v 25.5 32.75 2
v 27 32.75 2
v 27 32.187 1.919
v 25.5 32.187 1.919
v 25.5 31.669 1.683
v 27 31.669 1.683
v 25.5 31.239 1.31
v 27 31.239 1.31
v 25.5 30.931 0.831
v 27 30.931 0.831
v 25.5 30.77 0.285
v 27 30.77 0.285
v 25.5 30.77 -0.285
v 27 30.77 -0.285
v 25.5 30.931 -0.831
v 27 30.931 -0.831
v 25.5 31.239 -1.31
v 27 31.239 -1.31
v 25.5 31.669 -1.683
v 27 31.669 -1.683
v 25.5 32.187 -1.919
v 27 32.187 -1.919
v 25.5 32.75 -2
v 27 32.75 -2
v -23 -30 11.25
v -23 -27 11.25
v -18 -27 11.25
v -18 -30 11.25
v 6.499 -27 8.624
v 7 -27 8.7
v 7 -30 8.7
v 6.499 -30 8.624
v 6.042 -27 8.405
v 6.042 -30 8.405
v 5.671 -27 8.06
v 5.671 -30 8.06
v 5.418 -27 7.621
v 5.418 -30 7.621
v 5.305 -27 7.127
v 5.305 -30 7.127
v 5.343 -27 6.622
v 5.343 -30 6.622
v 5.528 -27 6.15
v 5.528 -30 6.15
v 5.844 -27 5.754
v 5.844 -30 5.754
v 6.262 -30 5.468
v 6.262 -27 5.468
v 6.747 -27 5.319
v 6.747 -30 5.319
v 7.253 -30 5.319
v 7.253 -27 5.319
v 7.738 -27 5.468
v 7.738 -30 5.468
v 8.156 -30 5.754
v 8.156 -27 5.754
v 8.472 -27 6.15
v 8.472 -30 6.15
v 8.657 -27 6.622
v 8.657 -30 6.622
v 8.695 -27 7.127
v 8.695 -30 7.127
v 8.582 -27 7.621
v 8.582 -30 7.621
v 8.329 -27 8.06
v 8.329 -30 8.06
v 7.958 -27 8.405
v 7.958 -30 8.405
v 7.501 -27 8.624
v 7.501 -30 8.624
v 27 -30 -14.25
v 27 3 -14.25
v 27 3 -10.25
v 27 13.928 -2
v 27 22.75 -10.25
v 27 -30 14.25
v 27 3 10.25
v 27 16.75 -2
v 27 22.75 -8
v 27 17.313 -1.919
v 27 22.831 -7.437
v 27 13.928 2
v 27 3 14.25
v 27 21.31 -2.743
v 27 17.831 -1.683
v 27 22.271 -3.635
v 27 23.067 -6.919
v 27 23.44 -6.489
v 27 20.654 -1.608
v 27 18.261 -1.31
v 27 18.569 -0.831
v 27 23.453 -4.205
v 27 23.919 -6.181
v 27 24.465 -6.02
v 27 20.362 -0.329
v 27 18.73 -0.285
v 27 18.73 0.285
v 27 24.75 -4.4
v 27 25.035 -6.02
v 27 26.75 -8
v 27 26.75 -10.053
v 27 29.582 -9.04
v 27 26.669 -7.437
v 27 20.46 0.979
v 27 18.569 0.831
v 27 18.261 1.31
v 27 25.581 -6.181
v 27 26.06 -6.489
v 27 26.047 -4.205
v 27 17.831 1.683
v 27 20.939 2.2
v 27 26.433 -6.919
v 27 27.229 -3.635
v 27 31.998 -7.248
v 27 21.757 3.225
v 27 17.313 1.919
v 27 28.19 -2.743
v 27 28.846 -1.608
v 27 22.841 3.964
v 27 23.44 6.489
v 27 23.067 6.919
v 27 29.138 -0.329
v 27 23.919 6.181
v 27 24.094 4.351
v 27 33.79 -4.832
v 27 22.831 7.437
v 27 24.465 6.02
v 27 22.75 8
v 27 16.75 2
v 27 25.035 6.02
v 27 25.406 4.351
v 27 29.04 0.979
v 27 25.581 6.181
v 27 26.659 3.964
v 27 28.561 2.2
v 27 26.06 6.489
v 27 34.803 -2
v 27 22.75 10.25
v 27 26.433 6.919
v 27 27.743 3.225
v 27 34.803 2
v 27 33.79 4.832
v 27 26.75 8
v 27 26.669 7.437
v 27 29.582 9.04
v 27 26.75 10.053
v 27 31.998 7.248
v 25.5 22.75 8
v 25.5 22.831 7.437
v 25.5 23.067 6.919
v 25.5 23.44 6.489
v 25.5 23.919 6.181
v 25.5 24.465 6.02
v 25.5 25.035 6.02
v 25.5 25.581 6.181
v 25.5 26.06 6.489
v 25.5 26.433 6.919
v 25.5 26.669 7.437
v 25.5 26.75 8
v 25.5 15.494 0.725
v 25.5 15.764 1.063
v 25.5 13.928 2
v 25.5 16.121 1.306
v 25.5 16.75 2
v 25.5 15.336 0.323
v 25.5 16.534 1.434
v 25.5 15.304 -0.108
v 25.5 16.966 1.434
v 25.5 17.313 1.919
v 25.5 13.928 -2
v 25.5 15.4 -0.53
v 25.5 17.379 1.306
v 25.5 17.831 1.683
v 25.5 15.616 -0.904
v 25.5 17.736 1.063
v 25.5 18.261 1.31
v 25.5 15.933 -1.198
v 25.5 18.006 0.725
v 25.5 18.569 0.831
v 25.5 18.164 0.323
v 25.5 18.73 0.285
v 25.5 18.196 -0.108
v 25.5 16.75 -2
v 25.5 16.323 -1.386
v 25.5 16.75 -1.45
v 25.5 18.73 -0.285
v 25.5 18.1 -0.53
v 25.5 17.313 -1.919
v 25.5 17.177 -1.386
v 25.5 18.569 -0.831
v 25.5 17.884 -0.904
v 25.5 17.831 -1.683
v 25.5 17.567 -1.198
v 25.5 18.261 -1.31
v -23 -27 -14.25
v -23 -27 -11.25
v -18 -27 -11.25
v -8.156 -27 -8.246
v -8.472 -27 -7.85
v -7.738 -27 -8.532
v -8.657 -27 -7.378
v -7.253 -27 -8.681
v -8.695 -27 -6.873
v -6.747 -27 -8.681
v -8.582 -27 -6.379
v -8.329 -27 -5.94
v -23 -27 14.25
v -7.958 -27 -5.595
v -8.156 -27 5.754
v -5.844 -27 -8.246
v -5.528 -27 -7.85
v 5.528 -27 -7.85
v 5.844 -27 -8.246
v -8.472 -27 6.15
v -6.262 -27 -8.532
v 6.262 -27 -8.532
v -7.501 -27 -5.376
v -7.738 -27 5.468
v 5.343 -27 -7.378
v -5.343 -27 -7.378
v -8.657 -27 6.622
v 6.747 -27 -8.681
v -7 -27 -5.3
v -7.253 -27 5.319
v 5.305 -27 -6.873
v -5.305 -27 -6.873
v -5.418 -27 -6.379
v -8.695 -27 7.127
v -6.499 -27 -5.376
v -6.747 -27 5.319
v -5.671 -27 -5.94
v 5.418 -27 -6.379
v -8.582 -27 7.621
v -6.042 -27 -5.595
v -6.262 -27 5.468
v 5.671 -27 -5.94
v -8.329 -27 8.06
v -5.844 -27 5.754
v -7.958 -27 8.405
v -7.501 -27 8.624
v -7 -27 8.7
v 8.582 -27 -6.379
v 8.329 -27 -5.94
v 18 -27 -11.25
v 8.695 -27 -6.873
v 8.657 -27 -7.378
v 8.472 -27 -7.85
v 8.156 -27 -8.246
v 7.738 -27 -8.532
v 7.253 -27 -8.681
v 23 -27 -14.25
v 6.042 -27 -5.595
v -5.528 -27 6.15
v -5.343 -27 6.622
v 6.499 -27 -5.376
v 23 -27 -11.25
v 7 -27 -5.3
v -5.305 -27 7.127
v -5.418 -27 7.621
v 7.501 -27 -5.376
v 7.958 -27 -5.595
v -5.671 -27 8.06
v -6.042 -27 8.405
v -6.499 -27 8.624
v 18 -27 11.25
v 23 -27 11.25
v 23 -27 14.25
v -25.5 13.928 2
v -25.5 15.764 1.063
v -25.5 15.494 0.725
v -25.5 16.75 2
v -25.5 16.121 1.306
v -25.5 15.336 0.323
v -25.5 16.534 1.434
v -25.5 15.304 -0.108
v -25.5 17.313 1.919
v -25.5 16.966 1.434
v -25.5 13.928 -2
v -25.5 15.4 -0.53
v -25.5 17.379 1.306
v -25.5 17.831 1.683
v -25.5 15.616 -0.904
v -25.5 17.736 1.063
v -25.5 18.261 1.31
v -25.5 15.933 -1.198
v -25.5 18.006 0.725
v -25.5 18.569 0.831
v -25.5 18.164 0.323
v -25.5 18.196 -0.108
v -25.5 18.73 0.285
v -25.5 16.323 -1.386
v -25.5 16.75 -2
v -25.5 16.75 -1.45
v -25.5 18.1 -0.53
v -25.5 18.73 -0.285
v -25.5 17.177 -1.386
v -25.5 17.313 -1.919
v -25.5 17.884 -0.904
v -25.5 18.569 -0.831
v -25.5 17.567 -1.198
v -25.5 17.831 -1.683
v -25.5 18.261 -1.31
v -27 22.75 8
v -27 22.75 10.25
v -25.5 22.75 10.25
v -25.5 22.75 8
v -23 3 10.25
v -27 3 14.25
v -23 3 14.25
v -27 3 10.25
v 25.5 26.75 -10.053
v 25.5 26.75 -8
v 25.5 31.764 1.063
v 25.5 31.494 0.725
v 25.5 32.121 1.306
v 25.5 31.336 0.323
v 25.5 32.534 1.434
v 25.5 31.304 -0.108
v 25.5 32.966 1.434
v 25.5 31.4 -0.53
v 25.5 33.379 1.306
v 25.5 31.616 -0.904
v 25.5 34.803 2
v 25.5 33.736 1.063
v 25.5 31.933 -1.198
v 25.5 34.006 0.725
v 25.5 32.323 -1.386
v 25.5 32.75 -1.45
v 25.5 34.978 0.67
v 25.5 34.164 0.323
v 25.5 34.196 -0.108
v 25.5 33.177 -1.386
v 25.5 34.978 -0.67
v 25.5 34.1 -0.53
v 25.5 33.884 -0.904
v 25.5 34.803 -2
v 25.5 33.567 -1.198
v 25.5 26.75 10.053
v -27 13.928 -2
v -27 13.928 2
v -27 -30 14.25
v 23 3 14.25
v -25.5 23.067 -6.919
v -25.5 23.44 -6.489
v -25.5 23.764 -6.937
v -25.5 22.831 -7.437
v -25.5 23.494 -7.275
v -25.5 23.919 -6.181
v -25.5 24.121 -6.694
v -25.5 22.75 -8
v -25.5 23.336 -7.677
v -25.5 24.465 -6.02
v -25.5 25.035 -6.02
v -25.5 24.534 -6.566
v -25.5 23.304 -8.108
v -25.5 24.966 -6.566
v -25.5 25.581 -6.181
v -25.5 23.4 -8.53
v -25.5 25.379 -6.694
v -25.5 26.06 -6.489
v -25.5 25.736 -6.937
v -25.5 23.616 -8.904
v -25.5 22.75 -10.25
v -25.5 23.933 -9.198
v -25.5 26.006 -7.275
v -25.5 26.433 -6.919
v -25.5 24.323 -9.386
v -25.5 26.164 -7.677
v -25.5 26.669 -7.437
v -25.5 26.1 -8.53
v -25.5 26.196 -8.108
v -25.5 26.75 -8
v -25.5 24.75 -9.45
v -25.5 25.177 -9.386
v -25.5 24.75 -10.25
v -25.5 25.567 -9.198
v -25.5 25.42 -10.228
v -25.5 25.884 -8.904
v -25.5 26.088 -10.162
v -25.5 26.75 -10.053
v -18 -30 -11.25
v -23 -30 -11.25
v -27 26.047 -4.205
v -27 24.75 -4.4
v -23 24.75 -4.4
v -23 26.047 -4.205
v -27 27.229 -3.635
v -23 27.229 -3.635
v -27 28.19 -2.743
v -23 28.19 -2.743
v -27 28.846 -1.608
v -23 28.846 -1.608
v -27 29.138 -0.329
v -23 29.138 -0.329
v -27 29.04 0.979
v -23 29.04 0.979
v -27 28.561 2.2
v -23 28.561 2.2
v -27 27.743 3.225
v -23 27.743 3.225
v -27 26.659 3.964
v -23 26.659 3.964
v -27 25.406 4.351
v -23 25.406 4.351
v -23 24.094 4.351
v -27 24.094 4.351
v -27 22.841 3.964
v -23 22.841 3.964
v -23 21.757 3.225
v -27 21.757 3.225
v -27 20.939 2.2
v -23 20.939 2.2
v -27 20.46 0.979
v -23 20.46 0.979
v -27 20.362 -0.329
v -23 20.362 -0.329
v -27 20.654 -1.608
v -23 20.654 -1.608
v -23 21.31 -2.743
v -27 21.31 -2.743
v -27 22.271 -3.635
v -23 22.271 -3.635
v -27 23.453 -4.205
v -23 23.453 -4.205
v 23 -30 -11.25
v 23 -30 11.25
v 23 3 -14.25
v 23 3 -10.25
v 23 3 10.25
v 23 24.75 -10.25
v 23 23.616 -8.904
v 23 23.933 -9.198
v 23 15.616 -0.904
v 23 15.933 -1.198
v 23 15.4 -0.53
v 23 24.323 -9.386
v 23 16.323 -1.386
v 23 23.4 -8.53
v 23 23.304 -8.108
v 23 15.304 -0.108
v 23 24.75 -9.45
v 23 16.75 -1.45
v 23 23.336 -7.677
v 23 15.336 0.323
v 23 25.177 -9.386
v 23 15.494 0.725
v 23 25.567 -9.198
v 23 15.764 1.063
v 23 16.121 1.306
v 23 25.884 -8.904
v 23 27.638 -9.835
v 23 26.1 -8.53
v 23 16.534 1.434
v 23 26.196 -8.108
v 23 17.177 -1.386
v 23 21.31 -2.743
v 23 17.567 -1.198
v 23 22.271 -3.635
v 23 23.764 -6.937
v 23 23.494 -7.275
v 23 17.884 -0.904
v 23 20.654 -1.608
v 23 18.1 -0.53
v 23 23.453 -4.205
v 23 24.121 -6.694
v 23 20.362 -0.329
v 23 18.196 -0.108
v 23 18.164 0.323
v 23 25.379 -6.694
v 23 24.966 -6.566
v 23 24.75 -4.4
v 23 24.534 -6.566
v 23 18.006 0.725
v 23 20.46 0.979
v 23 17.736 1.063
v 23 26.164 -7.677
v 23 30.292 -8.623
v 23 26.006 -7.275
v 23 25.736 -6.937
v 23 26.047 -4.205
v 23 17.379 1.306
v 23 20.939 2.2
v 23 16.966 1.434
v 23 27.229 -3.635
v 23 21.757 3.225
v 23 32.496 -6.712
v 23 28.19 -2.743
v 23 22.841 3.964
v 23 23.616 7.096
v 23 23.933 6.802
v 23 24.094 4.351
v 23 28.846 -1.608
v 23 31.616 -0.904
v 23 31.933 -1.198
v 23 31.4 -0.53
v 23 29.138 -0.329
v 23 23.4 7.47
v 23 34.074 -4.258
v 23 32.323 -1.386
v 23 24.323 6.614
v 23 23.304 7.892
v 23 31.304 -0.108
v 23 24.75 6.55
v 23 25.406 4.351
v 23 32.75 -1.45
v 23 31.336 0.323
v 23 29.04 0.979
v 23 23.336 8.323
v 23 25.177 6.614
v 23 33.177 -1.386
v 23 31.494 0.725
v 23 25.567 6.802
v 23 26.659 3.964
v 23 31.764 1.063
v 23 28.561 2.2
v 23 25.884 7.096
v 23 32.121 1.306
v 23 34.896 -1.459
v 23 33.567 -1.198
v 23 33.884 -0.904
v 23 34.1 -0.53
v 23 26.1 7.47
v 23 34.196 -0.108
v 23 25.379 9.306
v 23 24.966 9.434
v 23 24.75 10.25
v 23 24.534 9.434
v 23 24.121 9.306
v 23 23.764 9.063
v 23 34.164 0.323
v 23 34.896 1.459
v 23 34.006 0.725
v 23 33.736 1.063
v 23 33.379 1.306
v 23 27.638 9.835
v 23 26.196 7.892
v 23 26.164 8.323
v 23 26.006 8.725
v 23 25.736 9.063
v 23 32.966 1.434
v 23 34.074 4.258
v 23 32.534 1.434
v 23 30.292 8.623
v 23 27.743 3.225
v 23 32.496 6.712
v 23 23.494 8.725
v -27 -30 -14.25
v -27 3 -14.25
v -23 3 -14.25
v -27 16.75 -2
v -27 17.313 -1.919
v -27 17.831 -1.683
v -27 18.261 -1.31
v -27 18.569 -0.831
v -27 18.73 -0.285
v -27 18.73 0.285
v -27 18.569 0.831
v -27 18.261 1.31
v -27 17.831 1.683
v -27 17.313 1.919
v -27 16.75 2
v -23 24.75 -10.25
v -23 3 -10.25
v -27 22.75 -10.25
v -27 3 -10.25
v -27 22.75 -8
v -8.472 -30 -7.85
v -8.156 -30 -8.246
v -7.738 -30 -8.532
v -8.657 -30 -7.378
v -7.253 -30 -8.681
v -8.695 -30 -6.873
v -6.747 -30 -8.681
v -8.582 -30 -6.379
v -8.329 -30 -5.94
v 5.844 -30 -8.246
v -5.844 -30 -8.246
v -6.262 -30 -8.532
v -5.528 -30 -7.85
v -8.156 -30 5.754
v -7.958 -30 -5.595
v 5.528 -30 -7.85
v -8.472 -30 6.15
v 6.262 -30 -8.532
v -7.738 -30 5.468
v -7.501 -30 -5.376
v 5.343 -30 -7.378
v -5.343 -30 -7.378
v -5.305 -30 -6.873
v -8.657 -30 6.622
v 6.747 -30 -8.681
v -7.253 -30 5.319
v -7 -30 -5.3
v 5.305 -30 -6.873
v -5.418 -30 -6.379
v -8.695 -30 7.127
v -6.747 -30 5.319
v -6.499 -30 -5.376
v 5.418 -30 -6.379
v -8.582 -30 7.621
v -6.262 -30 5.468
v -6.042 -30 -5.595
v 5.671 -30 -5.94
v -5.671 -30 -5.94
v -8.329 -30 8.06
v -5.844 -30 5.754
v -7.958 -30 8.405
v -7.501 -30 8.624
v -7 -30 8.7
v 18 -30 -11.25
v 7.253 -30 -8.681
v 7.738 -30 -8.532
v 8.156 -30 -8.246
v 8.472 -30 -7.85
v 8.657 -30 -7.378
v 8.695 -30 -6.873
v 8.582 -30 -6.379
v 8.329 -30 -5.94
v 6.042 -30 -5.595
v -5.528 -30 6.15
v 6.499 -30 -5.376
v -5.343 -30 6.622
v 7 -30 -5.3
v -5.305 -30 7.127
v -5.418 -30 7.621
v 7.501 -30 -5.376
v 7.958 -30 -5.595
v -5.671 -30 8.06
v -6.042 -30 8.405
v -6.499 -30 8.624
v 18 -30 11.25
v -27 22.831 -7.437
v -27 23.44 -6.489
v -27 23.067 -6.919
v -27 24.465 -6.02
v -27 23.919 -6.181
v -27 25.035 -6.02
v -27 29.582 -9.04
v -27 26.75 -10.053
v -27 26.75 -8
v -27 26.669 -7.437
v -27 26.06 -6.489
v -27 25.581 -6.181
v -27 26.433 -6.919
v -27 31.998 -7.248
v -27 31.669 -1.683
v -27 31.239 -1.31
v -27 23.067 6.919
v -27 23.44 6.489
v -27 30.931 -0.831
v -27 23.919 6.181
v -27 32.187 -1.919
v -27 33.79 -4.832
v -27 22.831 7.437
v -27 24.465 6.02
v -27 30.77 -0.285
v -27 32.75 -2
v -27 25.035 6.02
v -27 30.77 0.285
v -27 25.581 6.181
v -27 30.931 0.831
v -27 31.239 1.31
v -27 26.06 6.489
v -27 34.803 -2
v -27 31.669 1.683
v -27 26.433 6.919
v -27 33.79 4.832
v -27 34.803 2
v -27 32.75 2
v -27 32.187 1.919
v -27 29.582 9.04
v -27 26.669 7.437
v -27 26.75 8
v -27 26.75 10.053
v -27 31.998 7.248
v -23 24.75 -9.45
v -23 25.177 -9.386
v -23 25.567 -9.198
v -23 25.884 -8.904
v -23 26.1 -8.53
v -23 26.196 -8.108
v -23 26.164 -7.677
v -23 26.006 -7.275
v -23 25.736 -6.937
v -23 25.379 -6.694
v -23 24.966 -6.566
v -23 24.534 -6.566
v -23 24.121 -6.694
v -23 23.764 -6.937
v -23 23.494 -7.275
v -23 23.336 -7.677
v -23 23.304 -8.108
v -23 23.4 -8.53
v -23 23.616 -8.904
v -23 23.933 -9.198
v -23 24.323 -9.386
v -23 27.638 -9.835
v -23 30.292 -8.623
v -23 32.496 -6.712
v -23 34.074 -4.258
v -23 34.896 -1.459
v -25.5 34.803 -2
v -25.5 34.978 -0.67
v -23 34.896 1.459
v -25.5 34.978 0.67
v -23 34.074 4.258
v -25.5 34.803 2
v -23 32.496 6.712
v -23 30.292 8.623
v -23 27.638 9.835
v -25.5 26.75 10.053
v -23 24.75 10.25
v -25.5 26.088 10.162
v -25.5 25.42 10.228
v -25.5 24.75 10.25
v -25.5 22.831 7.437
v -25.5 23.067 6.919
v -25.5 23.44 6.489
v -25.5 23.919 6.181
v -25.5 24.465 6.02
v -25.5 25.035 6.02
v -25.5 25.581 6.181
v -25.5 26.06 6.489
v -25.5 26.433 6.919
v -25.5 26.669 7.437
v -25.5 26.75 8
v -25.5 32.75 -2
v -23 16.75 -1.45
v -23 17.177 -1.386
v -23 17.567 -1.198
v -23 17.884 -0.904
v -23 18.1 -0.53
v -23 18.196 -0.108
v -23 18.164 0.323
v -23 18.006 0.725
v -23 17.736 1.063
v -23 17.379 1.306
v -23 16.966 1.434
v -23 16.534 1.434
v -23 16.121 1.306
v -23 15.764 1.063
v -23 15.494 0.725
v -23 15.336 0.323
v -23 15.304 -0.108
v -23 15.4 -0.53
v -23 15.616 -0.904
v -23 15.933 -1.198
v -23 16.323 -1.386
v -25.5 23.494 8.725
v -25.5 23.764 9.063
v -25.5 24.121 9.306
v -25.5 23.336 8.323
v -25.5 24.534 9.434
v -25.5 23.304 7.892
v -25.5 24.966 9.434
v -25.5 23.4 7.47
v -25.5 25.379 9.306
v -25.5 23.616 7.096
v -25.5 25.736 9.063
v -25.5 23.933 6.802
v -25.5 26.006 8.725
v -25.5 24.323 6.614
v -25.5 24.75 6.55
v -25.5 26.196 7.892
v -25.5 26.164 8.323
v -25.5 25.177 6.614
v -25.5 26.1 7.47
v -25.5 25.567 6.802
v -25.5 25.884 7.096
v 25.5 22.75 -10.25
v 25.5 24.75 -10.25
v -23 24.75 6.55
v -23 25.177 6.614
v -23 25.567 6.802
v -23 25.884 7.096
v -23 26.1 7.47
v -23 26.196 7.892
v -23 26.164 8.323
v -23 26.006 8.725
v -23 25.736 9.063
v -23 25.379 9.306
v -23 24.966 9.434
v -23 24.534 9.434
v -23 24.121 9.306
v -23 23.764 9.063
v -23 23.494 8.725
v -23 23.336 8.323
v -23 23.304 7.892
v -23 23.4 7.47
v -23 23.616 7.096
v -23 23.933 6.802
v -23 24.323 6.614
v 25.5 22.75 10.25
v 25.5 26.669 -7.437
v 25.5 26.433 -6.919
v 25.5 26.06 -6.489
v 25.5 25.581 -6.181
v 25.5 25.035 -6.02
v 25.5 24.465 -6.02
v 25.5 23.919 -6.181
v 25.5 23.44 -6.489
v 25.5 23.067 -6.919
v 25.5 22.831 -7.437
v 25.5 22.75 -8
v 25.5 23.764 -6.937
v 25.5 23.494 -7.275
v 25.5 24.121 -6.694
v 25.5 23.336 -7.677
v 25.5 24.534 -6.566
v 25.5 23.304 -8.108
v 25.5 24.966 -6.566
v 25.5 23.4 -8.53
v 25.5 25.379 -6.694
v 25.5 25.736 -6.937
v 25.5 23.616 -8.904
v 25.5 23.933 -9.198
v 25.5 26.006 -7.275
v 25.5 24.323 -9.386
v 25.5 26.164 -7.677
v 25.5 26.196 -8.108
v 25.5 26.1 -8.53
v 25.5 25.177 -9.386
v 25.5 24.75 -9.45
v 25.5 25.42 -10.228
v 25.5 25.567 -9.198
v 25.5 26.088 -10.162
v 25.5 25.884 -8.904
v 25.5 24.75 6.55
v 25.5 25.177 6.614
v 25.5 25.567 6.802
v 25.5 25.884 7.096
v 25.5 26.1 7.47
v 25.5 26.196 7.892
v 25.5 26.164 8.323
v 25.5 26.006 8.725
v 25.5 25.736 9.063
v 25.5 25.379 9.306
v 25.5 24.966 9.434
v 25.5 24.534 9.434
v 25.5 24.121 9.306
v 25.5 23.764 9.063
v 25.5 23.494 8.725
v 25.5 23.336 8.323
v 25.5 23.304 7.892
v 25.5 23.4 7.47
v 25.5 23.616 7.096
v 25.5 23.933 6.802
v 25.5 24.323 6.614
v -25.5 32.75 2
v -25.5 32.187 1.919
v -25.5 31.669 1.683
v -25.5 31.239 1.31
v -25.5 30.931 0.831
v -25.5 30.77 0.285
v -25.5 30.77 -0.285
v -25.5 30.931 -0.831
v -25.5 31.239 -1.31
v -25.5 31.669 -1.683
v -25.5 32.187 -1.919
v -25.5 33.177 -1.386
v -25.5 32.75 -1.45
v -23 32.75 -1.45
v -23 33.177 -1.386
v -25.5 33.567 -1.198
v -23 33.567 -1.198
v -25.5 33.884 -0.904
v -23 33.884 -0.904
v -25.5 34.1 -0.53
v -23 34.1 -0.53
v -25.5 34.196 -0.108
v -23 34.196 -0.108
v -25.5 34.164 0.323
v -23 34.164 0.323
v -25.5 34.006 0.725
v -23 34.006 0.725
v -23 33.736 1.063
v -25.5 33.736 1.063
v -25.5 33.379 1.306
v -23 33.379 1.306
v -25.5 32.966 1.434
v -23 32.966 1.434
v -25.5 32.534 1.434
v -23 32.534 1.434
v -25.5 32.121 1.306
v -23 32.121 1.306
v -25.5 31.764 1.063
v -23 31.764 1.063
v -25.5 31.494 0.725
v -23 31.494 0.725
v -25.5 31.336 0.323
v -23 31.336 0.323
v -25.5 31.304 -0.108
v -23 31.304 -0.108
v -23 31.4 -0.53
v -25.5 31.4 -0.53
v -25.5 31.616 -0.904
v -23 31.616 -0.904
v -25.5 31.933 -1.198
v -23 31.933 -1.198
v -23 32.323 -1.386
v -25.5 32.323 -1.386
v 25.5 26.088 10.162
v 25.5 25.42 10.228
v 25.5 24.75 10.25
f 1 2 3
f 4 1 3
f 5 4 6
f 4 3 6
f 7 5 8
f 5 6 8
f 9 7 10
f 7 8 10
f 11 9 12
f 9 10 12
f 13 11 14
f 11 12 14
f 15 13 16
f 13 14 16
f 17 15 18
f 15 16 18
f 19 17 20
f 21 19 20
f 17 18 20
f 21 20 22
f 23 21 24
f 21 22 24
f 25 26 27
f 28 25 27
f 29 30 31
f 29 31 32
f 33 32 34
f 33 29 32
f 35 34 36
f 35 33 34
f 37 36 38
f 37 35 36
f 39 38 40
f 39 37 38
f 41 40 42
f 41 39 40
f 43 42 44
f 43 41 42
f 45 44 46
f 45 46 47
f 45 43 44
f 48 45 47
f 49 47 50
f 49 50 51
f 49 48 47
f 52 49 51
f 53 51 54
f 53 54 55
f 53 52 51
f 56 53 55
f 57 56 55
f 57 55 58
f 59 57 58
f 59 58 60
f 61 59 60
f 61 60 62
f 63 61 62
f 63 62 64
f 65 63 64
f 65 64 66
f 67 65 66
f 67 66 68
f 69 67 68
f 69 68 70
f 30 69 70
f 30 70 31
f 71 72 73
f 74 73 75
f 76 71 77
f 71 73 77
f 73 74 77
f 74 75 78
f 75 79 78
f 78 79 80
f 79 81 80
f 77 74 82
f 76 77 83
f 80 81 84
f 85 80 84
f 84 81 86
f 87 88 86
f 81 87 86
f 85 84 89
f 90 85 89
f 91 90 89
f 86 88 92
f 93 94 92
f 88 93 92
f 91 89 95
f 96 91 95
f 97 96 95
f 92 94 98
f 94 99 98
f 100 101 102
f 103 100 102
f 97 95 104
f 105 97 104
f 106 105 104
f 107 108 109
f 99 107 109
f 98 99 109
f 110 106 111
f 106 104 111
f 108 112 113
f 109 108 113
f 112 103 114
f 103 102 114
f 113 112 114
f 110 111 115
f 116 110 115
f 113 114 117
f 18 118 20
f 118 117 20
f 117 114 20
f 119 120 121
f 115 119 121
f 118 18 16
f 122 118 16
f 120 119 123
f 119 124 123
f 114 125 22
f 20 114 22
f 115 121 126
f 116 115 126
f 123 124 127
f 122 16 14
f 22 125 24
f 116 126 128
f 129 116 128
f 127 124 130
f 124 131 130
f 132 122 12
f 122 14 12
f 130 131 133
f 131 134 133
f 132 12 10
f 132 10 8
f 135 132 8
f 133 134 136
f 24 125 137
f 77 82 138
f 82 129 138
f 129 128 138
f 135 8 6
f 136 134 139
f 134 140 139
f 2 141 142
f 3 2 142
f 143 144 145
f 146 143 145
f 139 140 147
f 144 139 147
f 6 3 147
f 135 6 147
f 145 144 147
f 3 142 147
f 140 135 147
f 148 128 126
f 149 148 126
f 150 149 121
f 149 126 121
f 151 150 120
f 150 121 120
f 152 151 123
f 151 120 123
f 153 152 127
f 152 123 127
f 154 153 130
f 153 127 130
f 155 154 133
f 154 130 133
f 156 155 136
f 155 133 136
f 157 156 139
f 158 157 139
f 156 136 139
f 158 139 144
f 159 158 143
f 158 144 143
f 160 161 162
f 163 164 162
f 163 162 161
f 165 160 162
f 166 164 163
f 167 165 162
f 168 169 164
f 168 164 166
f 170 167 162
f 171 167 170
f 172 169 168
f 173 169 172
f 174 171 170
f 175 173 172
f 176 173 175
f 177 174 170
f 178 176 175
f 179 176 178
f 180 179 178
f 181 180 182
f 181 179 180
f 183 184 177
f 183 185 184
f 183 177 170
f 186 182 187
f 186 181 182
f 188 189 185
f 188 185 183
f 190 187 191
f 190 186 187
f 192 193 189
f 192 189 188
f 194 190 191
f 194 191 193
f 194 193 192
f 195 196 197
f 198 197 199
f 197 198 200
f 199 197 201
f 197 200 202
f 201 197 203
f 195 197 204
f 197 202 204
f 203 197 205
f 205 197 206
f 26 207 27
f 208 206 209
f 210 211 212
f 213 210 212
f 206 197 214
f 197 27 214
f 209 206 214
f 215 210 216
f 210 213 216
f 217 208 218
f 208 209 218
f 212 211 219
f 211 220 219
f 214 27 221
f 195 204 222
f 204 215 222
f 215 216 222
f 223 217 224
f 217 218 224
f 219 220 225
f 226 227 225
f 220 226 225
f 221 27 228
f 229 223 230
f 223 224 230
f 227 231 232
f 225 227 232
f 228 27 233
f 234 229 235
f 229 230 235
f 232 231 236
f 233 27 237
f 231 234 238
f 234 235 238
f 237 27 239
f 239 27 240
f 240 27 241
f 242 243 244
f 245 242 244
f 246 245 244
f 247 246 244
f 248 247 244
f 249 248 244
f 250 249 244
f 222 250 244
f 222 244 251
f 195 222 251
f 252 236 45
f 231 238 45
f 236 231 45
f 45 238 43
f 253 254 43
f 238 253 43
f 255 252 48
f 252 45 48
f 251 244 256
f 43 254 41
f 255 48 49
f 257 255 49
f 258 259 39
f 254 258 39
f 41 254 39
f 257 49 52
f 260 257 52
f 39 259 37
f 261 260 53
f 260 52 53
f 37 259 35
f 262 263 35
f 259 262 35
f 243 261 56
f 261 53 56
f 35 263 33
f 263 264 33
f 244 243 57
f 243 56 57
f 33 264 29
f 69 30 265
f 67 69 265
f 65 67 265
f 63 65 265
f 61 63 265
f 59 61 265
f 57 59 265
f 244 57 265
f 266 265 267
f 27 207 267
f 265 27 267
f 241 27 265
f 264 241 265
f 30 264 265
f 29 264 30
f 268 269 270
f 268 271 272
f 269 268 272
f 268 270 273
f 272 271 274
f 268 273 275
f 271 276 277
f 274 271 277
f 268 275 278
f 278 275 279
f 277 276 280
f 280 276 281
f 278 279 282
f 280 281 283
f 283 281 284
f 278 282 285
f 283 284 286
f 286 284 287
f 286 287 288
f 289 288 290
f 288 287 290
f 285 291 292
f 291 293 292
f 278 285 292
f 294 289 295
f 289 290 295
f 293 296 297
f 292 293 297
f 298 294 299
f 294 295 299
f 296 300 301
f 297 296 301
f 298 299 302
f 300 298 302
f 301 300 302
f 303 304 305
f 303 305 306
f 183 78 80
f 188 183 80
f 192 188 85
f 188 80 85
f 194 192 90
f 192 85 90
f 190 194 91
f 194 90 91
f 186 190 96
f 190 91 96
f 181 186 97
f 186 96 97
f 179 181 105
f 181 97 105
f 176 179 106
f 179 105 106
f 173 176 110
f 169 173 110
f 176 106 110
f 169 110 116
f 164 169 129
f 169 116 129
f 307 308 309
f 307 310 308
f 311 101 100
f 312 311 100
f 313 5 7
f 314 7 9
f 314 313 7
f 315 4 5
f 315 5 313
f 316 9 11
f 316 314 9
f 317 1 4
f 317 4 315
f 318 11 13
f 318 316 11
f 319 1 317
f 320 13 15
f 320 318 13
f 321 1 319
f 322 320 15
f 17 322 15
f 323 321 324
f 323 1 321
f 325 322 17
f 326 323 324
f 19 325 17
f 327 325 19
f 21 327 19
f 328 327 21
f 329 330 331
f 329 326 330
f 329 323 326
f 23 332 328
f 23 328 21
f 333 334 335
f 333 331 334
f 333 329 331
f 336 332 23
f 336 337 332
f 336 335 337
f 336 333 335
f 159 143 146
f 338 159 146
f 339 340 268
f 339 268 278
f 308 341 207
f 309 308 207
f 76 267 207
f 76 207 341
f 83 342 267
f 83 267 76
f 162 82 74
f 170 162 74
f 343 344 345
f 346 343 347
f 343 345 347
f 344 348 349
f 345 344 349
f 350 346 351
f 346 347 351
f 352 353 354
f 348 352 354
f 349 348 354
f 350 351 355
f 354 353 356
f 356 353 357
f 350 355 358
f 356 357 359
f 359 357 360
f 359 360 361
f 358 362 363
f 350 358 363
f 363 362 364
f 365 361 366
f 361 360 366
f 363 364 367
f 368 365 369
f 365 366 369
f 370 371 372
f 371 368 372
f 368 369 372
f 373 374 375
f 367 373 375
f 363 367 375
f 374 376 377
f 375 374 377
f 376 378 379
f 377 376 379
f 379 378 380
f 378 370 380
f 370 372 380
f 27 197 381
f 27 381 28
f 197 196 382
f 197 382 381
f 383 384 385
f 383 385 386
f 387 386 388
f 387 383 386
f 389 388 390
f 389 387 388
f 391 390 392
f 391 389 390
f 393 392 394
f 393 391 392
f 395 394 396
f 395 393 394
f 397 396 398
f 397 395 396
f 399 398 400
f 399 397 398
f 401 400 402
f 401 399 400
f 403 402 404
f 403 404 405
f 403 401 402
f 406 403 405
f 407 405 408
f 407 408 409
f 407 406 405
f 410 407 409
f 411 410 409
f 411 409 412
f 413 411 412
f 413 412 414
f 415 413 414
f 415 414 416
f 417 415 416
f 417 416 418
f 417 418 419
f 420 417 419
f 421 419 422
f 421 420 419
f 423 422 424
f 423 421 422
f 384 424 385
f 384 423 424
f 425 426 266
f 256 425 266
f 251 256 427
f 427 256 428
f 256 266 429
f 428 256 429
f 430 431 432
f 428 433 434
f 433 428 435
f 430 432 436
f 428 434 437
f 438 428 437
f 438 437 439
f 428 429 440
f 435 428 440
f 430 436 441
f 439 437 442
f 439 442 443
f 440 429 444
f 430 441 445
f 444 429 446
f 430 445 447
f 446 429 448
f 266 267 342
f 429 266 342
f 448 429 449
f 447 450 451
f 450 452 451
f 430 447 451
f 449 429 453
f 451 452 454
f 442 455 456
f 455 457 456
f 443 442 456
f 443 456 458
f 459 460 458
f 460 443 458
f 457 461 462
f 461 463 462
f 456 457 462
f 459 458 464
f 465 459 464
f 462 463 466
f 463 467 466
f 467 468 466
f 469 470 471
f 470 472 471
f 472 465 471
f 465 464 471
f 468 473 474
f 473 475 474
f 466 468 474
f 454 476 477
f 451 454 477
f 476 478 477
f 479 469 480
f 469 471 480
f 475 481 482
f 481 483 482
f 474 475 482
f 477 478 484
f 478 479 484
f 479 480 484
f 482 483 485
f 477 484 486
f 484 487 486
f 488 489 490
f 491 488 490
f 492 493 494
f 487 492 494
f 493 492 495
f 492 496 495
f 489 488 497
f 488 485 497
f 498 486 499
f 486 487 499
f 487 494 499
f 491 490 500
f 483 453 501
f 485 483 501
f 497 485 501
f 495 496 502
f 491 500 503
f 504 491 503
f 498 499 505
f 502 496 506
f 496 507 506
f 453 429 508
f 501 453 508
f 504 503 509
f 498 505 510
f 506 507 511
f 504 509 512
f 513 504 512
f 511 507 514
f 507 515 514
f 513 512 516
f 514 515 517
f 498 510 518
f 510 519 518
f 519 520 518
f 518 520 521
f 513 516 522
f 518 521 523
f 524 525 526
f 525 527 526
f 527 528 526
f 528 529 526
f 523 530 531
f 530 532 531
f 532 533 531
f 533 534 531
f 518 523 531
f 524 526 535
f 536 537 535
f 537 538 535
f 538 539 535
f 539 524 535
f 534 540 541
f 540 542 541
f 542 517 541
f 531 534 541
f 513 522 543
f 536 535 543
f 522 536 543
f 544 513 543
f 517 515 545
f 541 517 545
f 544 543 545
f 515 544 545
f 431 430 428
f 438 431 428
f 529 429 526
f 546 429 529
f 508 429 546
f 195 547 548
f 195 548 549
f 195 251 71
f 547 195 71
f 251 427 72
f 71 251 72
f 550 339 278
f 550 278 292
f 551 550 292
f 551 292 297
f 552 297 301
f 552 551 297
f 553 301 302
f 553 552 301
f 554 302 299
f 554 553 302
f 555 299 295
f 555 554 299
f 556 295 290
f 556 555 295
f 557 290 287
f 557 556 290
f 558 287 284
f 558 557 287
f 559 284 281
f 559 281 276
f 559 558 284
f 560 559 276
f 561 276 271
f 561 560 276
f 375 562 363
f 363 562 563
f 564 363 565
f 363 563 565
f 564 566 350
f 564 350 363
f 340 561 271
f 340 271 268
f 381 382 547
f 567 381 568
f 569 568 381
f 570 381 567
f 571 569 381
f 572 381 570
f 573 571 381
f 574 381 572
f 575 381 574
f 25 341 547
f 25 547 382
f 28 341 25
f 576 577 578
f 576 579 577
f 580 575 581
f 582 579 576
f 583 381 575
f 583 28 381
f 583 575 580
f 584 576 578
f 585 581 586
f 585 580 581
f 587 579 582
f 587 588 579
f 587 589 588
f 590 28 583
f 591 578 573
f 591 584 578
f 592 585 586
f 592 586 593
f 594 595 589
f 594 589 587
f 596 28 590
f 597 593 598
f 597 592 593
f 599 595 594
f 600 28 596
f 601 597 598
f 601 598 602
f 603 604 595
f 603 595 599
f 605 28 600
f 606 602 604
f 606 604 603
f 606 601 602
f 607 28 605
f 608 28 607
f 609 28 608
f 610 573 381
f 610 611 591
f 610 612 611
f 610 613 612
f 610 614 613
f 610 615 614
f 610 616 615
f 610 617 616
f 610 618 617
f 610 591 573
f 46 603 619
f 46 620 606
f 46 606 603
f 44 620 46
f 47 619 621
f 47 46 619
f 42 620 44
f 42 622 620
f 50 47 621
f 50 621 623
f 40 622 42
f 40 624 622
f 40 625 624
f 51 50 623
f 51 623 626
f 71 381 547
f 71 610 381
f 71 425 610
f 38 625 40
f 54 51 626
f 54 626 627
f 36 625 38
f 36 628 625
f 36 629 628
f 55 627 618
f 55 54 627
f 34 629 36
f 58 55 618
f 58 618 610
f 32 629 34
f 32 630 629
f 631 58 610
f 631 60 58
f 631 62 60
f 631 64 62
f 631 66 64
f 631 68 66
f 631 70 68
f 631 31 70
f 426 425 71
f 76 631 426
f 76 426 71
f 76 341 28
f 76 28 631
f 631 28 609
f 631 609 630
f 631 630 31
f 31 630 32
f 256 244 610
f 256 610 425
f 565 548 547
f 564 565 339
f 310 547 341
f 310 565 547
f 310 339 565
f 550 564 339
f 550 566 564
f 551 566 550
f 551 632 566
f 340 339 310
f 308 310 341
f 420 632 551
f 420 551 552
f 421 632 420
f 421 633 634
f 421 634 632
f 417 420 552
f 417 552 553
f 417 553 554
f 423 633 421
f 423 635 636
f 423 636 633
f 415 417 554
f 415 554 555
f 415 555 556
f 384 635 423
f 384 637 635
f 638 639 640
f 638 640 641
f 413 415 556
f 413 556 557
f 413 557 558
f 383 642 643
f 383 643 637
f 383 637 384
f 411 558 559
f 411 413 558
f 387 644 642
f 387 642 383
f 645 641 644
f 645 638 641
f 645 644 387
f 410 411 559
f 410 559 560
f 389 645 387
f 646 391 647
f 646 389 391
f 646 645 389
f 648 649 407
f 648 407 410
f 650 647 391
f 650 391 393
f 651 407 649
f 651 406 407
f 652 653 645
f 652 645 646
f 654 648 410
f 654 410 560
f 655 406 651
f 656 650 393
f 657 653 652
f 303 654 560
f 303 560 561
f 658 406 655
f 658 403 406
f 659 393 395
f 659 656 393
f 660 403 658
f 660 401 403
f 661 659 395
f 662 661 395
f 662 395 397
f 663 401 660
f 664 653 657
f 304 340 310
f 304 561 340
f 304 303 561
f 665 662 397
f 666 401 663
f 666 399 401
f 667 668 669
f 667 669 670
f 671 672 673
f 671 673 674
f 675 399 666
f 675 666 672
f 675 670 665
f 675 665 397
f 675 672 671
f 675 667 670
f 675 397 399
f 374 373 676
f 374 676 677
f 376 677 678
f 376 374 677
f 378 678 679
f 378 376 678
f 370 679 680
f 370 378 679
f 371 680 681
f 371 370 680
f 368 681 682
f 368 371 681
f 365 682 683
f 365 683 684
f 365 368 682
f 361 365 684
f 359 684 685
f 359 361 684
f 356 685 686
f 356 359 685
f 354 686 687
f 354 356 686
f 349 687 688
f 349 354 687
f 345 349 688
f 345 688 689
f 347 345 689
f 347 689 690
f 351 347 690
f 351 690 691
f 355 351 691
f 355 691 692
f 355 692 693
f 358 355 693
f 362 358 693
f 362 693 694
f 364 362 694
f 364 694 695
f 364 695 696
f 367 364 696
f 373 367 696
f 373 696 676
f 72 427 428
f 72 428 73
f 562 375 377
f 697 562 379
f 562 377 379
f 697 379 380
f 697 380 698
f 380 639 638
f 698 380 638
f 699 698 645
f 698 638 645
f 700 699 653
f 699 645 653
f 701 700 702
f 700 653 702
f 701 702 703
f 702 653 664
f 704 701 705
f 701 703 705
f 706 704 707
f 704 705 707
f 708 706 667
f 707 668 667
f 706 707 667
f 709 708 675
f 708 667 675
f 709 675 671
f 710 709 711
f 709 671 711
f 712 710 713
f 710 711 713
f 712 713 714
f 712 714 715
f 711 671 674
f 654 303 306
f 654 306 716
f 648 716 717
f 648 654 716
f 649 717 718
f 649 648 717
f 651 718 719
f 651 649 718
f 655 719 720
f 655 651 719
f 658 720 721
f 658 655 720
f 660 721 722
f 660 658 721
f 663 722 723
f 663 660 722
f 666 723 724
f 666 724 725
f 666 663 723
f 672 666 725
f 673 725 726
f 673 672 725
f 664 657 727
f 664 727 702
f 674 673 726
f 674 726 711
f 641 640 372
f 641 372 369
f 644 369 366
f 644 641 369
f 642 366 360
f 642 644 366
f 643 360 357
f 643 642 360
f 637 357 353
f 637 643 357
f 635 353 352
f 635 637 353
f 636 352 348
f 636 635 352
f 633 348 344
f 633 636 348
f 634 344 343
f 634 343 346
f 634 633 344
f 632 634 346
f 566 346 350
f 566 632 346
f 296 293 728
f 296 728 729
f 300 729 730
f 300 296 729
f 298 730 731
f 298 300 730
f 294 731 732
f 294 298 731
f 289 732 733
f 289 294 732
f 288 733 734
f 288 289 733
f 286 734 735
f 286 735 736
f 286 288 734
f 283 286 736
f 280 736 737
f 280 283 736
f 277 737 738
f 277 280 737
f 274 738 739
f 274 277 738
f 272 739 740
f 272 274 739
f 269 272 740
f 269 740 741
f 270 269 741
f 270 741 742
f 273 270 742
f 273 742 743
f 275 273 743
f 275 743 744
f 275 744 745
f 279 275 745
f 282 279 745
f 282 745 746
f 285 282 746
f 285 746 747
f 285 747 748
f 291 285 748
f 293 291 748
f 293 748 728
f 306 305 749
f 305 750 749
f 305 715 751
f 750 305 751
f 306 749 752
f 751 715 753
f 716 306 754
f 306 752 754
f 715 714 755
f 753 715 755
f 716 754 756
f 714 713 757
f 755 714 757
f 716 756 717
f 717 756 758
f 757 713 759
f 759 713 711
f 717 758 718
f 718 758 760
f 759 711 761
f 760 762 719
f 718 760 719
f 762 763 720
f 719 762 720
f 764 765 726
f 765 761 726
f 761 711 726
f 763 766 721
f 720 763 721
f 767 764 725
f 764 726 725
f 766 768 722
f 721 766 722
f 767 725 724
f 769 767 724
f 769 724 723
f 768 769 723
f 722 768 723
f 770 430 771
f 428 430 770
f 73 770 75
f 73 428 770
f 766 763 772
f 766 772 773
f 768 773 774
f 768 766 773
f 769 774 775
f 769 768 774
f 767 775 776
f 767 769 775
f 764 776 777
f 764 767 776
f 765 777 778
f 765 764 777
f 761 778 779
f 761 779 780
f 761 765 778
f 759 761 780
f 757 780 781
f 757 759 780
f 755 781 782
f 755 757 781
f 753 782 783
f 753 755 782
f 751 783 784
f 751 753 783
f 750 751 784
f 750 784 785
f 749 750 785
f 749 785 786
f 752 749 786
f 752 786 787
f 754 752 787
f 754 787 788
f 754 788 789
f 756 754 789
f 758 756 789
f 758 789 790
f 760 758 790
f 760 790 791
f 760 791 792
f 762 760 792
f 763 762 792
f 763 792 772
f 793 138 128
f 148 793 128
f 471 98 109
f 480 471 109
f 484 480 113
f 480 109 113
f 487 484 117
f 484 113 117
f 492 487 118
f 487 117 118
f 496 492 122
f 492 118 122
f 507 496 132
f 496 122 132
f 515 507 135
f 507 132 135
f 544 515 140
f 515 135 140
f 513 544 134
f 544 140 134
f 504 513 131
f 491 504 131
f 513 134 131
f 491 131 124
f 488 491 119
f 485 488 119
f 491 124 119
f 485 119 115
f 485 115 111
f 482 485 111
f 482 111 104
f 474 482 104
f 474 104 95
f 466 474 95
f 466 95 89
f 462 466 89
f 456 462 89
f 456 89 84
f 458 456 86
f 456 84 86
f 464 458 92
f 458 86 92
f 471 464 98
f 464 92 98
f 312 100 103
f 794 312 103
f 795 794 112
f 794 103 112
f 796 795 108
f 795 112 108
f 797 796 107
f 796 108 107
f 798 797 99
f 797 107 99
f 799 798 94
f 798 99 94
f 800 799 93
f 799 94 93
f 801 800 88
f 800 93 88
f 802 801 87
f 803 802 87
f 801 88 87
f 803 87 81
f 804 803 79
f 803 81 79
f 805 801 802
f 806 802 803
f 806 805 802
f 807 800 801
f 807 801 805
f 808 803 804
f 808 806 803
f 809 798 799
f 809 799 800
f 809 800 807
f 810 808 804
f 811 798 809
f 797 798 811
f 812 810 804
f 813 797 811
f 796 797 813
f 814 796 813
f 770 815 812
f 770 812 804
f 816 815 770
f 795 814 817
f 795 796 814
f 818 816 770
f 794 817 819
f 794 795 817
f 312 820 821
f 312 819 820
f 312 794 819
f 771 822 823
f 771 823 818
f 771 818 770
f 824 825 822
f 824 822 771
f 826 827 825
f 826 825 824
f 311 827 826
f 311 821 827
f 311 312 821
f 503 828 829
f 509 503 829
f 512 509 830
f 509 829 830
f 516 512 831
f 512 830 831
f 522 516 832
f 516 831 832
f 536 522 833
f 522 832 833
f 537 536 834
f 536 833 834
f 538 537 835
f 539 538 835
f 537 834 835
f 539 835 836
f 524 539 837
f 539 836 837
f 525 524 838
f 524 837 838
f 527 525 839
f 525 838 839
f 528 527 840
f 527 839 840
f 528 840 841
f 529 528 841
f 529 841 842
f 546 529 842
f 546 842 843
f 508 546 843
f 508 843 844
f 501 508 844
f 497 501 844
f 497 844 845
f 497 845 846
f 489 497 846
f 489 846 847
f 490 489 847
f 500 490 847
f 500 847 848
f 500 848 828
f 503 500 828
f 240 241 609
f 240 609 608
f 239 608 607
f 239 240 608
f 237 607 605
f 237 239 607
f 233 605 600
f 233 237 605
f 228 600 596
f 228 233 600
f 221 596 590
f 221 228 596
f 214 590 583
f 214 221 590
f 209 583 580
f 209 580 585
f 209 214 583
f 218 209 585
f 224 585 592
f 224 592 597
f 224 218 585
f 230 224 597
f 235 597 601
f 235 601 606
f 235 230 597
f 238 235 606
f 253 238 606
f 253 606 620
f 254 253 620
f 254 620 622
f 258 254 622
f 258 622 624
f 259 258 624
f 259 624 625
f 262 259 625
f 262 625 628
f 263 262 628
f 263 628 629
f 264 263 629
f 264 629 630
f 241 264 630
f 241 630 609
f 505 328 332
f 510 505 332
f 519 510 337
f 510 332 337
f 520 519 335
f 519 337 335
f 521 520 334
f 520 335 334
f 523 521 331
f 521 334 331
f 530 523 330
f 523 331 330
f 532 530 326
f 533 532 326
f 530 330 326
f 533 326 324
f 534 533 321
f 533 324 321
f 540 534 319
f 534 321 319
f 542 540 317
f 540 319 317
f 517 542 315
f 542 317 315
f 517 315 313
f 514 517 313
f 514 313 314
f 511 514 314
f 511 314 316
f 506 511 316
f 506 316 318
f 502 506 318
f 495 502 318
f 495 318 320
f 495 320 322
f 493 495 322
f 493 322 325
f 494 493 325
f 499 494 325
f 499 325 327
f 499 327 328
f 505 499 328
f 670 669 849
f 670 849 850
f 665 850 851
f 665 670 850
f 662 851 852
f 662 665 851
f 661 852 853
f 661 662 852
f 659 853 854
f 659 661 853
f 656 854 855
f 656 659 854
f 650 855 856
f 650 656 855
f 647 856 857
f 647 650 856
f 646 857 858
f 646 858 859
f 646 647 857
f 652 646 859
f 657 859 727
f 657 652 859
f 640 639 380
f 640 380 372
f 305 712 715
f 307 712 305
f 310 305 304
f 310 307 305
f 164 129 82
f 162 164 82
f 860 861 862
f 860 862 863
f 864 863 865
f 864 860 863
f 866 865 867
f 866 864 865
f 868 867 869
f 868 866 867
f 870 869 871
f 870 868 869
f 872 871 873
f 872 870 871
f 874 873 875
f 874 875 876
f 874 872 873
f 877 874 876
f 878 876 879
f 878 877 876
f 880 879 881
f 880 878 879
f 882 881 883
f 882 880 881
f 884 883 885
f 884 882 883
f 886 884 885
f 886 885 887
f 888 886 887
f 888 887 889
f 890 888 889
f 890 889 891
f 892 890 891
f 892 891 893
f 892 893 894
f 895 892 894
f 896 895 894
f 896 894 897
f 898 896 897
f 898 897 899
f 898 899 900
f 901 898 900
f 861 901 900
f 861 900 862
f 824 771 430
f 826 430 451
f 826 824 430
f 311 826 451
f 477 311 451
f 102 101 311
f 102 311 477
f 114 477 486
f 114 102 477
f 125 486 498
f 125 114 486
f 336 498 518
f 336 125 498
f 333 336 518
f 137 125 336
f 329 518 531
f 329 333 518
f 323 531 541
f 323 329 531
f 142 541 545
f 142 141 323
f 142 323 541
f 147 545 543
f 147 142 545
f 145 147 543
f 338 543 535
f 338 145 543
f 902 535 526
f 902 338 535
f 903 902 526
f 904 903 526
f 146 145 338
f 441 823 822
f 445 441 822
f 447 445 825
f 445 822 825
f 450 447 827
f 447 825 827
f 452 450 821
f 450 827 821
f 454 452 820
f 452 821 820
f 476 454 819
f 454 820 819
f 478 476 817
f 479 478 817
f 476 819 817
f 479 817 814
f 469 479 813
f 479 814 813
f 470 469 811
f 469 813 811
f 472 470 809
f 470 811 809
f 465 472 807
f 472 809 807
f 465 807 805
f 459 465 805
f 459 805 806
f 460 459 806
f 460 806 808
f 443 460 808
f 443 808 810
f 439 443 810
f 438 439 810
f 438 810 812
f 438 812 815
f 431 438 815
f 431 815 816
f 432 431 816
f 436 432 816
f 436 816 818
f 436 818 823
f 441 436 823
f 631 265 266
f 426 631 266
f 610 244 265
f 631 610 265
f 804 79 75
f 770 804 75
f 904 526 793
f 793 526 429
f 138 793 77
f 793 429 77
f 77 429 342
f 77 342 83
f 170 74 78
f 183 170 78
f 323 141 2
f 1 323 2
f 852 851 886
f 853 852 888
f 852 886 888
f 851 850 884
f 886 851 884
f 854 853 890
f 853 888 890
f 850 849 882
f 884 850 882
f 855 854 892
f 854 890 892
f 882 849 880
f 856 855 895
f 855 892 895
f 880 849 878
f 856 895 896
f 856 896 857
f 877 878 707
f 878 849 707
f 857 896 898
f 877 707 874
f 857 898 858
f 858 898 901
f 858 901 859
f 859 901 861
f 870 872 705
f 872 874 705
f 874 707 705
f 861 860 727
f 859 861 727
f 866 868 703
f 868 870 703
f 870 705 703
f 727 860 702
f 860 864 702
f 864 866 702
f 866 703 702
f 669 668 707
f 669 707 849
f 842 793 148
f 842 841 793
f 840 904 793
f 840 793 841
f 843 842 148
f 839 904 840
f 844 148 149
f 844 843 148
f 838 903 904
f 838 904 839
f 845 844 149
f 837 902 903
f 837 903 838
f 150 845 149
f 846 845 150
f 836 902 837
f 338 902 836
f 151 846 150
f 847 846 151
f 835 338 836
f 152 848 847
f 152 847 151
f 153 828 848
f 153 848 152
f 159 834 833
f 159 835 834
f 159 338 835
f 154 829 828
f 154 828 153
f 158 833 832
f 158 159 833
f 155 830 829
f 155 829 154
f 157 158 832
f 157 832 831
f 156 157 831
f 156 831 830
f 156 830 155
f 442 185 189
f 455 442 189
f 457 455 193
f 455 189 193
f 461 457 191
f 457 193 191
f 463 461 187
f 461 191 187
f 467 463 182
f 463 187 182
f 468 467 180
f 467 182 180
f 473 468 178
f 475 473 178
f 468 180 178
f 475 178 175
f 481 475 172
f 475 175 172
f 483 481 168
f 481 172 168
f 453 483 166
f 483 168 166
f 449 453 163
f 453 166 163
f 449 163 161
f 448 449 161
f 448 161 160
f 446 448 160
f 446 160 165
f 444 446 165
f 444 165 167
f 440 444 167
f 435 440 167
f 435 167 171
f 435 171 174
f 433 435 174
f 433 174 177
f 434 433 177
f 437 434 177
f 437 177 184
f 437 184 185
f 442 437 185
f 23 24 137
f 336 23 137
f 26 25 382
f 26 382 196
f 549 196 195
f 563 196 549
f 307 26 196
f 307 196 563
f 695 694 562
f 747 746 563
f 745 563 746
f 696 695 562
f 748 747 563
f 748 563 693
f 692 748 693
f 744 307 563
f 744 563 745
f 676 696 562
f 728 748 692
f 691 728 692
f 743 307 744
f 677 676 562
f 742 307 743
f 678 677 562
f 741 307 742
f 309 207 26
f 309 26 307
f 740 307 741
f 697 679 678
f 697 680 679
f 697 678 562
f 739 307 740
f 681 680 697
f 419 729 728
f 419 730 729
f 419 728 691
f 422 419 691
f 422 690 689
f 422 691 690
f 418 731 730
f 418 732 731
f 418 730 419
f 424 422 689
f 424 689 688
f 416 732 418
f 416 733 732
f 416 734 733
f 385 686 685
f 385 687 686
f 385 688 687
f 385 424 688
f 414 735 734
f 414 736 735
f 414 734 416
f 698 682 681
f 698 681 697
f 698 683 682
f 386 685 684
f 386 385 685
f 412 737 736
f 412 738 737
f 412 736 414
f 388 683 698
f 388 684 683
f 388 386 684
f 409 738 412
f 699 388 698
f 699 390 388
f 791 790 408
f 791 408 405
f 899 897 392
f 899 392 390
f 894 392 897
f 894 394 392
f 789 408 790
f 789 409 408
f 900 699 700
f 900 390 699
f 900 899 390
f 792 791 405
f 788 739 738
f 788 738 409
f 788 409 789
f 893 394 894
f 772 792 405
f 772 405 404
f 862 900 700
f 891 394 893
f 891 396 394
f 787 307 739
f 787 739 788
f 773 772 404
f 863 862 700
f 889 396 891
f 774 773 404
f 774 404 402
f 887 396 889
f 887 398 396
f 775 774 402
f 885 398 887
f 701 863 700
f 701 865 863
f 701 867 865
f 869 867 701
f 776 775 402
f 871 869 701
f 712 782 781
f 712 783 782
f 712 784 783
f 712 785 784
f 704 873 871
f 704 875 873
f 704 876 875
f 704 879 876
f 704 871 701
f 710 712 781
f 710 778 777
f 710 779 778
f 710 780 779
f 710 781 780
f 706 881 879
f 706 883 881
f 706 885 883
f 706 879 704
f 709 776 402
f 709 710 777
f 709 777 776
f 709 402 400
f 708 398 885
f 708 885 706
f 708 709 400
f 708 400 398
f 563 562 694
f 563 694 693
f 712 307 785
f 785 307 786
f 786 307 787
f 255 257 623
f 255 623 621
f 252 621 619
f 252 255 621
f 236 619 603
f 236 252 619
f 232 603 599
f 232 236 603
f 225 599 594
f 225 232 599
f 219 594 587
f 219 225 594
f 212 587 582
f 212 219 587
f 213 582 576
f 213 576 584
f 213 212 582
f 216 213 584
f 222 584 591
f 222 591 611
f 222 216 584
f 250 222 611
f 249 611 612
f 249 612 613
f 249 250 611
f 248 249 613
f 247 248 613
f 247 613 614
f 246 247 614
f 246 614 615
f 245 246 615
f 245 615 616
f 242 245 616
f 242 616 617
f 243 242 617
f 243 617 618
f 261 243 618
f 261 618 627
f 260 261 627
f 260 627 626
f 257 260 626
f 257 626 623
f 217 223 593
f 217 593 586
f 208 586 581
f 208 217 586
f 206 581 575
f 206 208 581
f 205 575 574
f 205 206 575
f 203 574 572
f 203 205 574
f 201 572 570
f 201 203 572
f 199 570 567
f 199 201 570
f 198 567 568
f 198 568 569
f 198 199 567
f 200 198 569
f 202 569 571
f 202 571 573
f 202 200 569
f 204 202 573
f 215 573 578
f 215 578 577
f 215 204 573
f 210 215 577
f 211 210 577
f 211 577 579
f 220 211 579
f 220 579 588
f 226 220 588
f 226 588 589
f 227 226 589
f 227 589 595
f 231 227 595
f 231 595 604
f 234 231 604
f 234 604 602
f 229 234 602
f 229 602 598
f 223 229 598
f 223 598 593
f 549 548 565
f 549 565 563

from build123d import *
from build123d.topology import SkipClean

# Parameters (mm, degrees)
SKETCH1_W           = 54
SKETCH1_H           = 28.5
SKETCH1_W_2         = 5
SKETCH1_H_2         = 22.5
SKETCH1_R           = 1.7
SKETCH1_R_2         = 7.5
BOSS_EXTRUDE2_DEPTH = 3
SKETCH2_W           = 4
SKETCH2_H           = 20.5
BOSS_EXTRUDE3_DEPTH = 21.75
SKETCH4_R           = 10.25
BOSS_EXTRUDE4_DEPTH = 4
SKETCH6_R           = 4.4
SKETCH6_R_2         = 1.45
CUT_EXTRUDE3_DEPTH  = 4
SKETCH7_R           = 1.45
CUT_EXTRUDE4_DEPTH  = 1.5
SKETCH8_W           = 28.781481152
SKETCH8_H           = 28.5
BOSS_EXTRUDE5_DEPTH = 3
SKETCH9_R           = 1.7
CUT_EXTRUDE5_DEPTH  = 3
SKETCH10_W          = 54
SKETCH10_H          = 28.5
SKETCH10_R          = 1.7
SKETCH10_W_2        = 5
SKETCH10_H_2        = 22.5
BOSS_EXTRUDE7_DEPTH = 30
SKETCH11_W          = 46
SKETCH11_H          = 30
CUT_EXTRUDE6_DEPTH  = 30


with BuildPart() as part:
    # Sketch1 → Boss-Extrude2 (new body)
    with BuildSketch(Plane(origin=(0, 0, 0), x_dir=(1, 0, 0), z_dir=(0, 1, 0))):
        Rectangle(SKETCH1_W, SKETCH1_H)
        with Locations((20.5, 0)):
            Rectangle(SKETCH1_W_2, SKETCH1_H_2, mode=Mode.SUBTRACT)
        with Locations((-20.5, 0)):
            Rectangle(SKETCH1_W_2, SKETCH1_H_2, mode=Mode.SUBTRACT)
        with Locations(Location((-9, -8.25, 0), (0, 0, 270))):
            Circle(SKETCH1_R, mode=Mode.SUBTRACT)
        with Locations(Location((9, -8.25, 0), (0, 0, 270))):
            Circle(SKETCH1_R, mode=Mode.SUBTRACT)
        with Locations(Location((-9, 8.25, 0), (0, 0, 270))):
            Circle(SKETCH1_R, mode=Mode.SUBTRACT)
        with Locations(Location((0, 0, 0), (0, 0, 270))):
            Circle(SKETCH1_R_2, mode=Mode.SUBTRACT)
        with Locations(Location((9, 8.25, 0), (0, 0, 270))):
            Circle(SKETCH1_R, mode=Mode.SUBTRACT)
    extrude(amount=BOSS_EXTRUDE2_DEPTH)

    # Sketch2 → Boss-Extrude3 (add)
    with BuildSketch(Plane(origin=(0, 3, 0), x_dir=(1, 0, 0), z_dir=(0, 1, 0))):
        with Locations((25, 0)):
            Rectangle(SKETCH2_W, SKETCH2_H)
    boss_extrude3 = extrude(amount=BOSS_EXTRUDE3_DEPTH)

    # Sketch4 → Boss-Extrude4 (add)
    with BuildSketch(Plane(origin=(27, 0, 0), x_dir=(0, 0, -1), z_dir=(1, 0, 0))):
        with Locations((0, 24.75)):
            Circle(SKETCH4_R)
    boss_extrude4 = extrude(amount=-BOSS_EXTRUDE4_DEPTH)

    # Mirror1: Boss-Extrude3, Boss-Extrude4 across plane
    add(boss_extrude3.mirror(Plane(origin=(0, 0, 0), x_dir=(0, 0, 1), z_dir=(1, 0, 0))))
    add(boss_extrude4.mirror(Plane(origin=(0, 0, 0), x_dir=(0, 0, 1), z_dir=(1, 0, 0))))

    # Sketch6 → Cut-Extrude3 (cut)
    with BuildSketch(Plane(origin=(27, 0, 0), x_dir=(0, 0, -1), z_dir=(1, 0, 0))):
        with Locations((0, 24.75)):
            Circle(SKETCH6_R)
        with Locations((0, 32.75)):
            Circle(SKETCH6_R_2)
        with Locations((8, 24.75)):
            Circle(SKETCH6_R_2)
        with Locations((0, 16.75)):
            Circle(SKETCH6_R_2)
        with Locations((-8, 24.75)):
            Circle(SKETCH6_R_2)
    cut_extrude3 = extrude(amount=-CUT_EXTRUDE3_DEPTH, mode=Mode.SUBTRACT)

    # Mirror3: Cut-Extrude3 across plane
    add(cut_extrude3.mirror(Plane(origin=(0, 0, 0), x_dir=(0, 0, 1), z_dir=(1, 0, 0))), mode=Mode.SUBTRACT)

    # Sketch7 → Cut-Extrude4 (cut)
    # profile 1 of 4: a face of its own
    with BuildSketch(Plane(origin=(27, 0, 0), x_dir=(0, 0, -1), z_dir=(1, 0, 0))):
        with BuildLine():
            ThreePointArc((10.25, 24.75), (10.200627247, 25.754840168), (10.052984631, 26.75))
            Line((10.052984631, 26.75), (8, 26.75))
            ThreePointArc((8, 26.75), (6, 24.75), (8, 22.75))
            Line((8, 22.75), (10.25, 22.75))
            Line((10.25, 22.75), (10.25, 24.75))
        make_face()
        with Locations((8, 24.75)):
            Circle(SKETCH7_R, mode=Mode.SUBTRACT)
    # profile 2 of 4: a face of its own
    with BuildSketch(Plane(origin=(27, 0, 0), x_dir=(0, 0, -1), z_dir=(1, 0, 0))):
        with BuildLine():
            Line((2, 32.75), (2, 34.802984631))
            ThreePointArc((2, 34.802984631), (0, 35), (-2, 34.802984631))
            Line((-2, 34.802984631), (-2, 32.75))
            ThreePointArc((-2, 32.75), (0, 30.75), (2, 32.75))
        make_face()
        with Locations((0, 32.75)):
            Circle(SKETCH7_R, mode=Mode.SUBTRACT)
    # profile 3 of 4: a face of its own
    with BuildSketch(Plane(origin=(27, 0, 0), x_dir=(0, 0, -1), z_dir=(1, 0, 0))):
        with BuildLine():
            Line((-8, 26.75), (-10.052984631, 26.75))
            ThreePointArc((-10.052984631, 26.75), (-10.200627247, 25.754840168), (-10.25, 24.75))
            Line((-10.25, 24.75), (-10.25, 22.75))
            Line((-10.25, 22.75), (-8, 22.75))
            ThreePointArc((-8, 22.75), (-6, 24.75), (-8, 26.75))
        make_face()
        with Locations((-8, 24.75)):
            Circle(SKETCH7_R, mode=Mode.SUBTRACT)
    # profile 4 of 4: a face of its own
    with BuildSketch(Plane(origin=(27, 0, 0), x_dir=(0, 0, -1), z_dir=(1, 0, 0))):
        with BuildLine():
            Line((-2, 16.75), (-2, 13.927640071))
            Line((-2, 13.927640071), (2, 13.927640071))
            Line((2, 13.927640071), (2, 16.75))
            ThreePointArc((2, 16.75), (0, 18.75), (-2, 16.75))
        make_face()
        with Locations((0, 16.75)):
            Circle(SKETCH7_R, mode=Mode.SUBTRACT)
    cut_extrude4 = extrude(amount=-CUT_EXTRUDE4_DEPTH, mode=Mode.SUBTRACT)

    # Mirror4: Cut-Extrude4 across plane
    add(cut_extrude4.mirror(Plane(origin=(0, 0, 0), x_dir=(0, 0, 1), z_dir=(1, 0, 0))), mode=Mode.SUBTRACT)

    # Sketch8 → Boss-Extrude5 (add)
    with BuildSketch(Plane(origin=(0, 3, 0), x_dir=(1, 0, 0), z_dir=(0, 1, 0))):
        Rectangle(SKETCH8_W, SKETCH8_H)
    extrude(amount=-BOSS_EXTRUDE5_DEPTH)

    # Sketch9 → Cut-Extrude5 (cut)
    with BuildSketch(Plane(origin=(0, 3, 0), x_dir=(1, 0, 0), z_dir=(0, 1, 0))):
        with BuildLine():
            ThreePointArc((-5.3, -7), (-5.797918472, -5.797918472), (-7, -5.3))
            Line((-7, -5.3), (-7, -7))
            Line((-7, -7), (-5.3, -7))
        make_face()
        with BuildLine():
            Line((-7, -7), (-7, -5.3))
            ThreePointArc((-7, -5.3), (-8.202081528, -8.202081528), (-5.3, -7))
            Line((-5.3, -7), (-7, -7))
        make_face()
        with BuildLine():
            ThreePointArc((8.7, -7), (8.202081528, -5.797918472), (7, -5.3))
            Line((7, -5.3), (7, -7))
            Line((7, -7), (5.3, -7))
            ThreePointArc((5.3, -7), (7, -8.7), (8.7, -7))
        make_face()
        with BuildLine():
            Line((7, -7), (7, -5.3))
            ThreePointArc((7, -5.3), (5.797918472, -5.797918472), (5.3, -7))
            Line((5.3, -7), (7, -7))
        make_face()
        with BuildLine():
            ThreePointArc((8.7, 7), (7, 8.7), (5.3, 7))
            Line((5.3, 7), (7, 7))
            Line((7, 7), (7, 5.3))
            ThreePointArc((7, 5.3), (8.202081528, 5.797918472), (8.7, 7))
        make_face()
        with BuildLine():
            Line((7, 7), (5.3, 7))
            ThreePointArc((5.3, 7), (5.797918472, 5.797918472), (7, 5.3))
            Line((7, 5.3), (7, 7))
        make_face()
        with Locations(Location((-7, 7, 0), (0, 0, 270))):
            Circle(SKETCH9_R)
    extrude(amount=-CUT_EXTRUDE5_DEPTH, mode=Mode.SUBTRACT)

    # Sketch10 → Boss-Extrude7 (add)
    with SkipClean():  # the faces are left unmerged after this step: merging them gives an invalid solid
        with BuildSketch(Plane.XZ):
            Rectangle(SKETCH10_W, SKETCH10_H)
            with Locations(Location((-7, 7, 0), (0, 0, 90))):
                Circle(SKETCH10_R, mode=Mode.SUBTRACT)
            with Locations(Location((7, 7, 0), (0, 0, 90))):
                Circle(SKETCH10_R, mode=Mode.SUBTRACT)
            with Locations(Location((7, -7, 0), (0, 0, 90))):
                Circle(SKETCH10_R, mode=Mode.SUBTRACT)
            with Locations(Location((-7, -7, 0), (0, 0, 90))):
                Circle(SKETCH10_R, mode=Mode.SUBTRACT)
            with Locations((-20.5, 0)):
                Rectangle(SKETCH10_W_2, SKETCH10_H_2, mode=Mode.SUBTRACT)
            with Locations((20.5, 0)):
                Rectangle(SKETCH10_W_2, SKETCH10_H_2, mode=Mode.SUBTRACT)
        extrude(amount=BOSS_EXTRUDE7_DEPTH)

    # Sketch11 → Cut-Extrude6 (cut)
    with BuildSketch(Plane.XY.offset(14.25)):
        with Locations((0, -12)):
            Rectangle(SKETCH11_W, SKETCH11_H)
    extrude(amount=-CUT_EXTRUDE6_DEPTH, mode=Mode.SUBTRACT)


solid = part.part
